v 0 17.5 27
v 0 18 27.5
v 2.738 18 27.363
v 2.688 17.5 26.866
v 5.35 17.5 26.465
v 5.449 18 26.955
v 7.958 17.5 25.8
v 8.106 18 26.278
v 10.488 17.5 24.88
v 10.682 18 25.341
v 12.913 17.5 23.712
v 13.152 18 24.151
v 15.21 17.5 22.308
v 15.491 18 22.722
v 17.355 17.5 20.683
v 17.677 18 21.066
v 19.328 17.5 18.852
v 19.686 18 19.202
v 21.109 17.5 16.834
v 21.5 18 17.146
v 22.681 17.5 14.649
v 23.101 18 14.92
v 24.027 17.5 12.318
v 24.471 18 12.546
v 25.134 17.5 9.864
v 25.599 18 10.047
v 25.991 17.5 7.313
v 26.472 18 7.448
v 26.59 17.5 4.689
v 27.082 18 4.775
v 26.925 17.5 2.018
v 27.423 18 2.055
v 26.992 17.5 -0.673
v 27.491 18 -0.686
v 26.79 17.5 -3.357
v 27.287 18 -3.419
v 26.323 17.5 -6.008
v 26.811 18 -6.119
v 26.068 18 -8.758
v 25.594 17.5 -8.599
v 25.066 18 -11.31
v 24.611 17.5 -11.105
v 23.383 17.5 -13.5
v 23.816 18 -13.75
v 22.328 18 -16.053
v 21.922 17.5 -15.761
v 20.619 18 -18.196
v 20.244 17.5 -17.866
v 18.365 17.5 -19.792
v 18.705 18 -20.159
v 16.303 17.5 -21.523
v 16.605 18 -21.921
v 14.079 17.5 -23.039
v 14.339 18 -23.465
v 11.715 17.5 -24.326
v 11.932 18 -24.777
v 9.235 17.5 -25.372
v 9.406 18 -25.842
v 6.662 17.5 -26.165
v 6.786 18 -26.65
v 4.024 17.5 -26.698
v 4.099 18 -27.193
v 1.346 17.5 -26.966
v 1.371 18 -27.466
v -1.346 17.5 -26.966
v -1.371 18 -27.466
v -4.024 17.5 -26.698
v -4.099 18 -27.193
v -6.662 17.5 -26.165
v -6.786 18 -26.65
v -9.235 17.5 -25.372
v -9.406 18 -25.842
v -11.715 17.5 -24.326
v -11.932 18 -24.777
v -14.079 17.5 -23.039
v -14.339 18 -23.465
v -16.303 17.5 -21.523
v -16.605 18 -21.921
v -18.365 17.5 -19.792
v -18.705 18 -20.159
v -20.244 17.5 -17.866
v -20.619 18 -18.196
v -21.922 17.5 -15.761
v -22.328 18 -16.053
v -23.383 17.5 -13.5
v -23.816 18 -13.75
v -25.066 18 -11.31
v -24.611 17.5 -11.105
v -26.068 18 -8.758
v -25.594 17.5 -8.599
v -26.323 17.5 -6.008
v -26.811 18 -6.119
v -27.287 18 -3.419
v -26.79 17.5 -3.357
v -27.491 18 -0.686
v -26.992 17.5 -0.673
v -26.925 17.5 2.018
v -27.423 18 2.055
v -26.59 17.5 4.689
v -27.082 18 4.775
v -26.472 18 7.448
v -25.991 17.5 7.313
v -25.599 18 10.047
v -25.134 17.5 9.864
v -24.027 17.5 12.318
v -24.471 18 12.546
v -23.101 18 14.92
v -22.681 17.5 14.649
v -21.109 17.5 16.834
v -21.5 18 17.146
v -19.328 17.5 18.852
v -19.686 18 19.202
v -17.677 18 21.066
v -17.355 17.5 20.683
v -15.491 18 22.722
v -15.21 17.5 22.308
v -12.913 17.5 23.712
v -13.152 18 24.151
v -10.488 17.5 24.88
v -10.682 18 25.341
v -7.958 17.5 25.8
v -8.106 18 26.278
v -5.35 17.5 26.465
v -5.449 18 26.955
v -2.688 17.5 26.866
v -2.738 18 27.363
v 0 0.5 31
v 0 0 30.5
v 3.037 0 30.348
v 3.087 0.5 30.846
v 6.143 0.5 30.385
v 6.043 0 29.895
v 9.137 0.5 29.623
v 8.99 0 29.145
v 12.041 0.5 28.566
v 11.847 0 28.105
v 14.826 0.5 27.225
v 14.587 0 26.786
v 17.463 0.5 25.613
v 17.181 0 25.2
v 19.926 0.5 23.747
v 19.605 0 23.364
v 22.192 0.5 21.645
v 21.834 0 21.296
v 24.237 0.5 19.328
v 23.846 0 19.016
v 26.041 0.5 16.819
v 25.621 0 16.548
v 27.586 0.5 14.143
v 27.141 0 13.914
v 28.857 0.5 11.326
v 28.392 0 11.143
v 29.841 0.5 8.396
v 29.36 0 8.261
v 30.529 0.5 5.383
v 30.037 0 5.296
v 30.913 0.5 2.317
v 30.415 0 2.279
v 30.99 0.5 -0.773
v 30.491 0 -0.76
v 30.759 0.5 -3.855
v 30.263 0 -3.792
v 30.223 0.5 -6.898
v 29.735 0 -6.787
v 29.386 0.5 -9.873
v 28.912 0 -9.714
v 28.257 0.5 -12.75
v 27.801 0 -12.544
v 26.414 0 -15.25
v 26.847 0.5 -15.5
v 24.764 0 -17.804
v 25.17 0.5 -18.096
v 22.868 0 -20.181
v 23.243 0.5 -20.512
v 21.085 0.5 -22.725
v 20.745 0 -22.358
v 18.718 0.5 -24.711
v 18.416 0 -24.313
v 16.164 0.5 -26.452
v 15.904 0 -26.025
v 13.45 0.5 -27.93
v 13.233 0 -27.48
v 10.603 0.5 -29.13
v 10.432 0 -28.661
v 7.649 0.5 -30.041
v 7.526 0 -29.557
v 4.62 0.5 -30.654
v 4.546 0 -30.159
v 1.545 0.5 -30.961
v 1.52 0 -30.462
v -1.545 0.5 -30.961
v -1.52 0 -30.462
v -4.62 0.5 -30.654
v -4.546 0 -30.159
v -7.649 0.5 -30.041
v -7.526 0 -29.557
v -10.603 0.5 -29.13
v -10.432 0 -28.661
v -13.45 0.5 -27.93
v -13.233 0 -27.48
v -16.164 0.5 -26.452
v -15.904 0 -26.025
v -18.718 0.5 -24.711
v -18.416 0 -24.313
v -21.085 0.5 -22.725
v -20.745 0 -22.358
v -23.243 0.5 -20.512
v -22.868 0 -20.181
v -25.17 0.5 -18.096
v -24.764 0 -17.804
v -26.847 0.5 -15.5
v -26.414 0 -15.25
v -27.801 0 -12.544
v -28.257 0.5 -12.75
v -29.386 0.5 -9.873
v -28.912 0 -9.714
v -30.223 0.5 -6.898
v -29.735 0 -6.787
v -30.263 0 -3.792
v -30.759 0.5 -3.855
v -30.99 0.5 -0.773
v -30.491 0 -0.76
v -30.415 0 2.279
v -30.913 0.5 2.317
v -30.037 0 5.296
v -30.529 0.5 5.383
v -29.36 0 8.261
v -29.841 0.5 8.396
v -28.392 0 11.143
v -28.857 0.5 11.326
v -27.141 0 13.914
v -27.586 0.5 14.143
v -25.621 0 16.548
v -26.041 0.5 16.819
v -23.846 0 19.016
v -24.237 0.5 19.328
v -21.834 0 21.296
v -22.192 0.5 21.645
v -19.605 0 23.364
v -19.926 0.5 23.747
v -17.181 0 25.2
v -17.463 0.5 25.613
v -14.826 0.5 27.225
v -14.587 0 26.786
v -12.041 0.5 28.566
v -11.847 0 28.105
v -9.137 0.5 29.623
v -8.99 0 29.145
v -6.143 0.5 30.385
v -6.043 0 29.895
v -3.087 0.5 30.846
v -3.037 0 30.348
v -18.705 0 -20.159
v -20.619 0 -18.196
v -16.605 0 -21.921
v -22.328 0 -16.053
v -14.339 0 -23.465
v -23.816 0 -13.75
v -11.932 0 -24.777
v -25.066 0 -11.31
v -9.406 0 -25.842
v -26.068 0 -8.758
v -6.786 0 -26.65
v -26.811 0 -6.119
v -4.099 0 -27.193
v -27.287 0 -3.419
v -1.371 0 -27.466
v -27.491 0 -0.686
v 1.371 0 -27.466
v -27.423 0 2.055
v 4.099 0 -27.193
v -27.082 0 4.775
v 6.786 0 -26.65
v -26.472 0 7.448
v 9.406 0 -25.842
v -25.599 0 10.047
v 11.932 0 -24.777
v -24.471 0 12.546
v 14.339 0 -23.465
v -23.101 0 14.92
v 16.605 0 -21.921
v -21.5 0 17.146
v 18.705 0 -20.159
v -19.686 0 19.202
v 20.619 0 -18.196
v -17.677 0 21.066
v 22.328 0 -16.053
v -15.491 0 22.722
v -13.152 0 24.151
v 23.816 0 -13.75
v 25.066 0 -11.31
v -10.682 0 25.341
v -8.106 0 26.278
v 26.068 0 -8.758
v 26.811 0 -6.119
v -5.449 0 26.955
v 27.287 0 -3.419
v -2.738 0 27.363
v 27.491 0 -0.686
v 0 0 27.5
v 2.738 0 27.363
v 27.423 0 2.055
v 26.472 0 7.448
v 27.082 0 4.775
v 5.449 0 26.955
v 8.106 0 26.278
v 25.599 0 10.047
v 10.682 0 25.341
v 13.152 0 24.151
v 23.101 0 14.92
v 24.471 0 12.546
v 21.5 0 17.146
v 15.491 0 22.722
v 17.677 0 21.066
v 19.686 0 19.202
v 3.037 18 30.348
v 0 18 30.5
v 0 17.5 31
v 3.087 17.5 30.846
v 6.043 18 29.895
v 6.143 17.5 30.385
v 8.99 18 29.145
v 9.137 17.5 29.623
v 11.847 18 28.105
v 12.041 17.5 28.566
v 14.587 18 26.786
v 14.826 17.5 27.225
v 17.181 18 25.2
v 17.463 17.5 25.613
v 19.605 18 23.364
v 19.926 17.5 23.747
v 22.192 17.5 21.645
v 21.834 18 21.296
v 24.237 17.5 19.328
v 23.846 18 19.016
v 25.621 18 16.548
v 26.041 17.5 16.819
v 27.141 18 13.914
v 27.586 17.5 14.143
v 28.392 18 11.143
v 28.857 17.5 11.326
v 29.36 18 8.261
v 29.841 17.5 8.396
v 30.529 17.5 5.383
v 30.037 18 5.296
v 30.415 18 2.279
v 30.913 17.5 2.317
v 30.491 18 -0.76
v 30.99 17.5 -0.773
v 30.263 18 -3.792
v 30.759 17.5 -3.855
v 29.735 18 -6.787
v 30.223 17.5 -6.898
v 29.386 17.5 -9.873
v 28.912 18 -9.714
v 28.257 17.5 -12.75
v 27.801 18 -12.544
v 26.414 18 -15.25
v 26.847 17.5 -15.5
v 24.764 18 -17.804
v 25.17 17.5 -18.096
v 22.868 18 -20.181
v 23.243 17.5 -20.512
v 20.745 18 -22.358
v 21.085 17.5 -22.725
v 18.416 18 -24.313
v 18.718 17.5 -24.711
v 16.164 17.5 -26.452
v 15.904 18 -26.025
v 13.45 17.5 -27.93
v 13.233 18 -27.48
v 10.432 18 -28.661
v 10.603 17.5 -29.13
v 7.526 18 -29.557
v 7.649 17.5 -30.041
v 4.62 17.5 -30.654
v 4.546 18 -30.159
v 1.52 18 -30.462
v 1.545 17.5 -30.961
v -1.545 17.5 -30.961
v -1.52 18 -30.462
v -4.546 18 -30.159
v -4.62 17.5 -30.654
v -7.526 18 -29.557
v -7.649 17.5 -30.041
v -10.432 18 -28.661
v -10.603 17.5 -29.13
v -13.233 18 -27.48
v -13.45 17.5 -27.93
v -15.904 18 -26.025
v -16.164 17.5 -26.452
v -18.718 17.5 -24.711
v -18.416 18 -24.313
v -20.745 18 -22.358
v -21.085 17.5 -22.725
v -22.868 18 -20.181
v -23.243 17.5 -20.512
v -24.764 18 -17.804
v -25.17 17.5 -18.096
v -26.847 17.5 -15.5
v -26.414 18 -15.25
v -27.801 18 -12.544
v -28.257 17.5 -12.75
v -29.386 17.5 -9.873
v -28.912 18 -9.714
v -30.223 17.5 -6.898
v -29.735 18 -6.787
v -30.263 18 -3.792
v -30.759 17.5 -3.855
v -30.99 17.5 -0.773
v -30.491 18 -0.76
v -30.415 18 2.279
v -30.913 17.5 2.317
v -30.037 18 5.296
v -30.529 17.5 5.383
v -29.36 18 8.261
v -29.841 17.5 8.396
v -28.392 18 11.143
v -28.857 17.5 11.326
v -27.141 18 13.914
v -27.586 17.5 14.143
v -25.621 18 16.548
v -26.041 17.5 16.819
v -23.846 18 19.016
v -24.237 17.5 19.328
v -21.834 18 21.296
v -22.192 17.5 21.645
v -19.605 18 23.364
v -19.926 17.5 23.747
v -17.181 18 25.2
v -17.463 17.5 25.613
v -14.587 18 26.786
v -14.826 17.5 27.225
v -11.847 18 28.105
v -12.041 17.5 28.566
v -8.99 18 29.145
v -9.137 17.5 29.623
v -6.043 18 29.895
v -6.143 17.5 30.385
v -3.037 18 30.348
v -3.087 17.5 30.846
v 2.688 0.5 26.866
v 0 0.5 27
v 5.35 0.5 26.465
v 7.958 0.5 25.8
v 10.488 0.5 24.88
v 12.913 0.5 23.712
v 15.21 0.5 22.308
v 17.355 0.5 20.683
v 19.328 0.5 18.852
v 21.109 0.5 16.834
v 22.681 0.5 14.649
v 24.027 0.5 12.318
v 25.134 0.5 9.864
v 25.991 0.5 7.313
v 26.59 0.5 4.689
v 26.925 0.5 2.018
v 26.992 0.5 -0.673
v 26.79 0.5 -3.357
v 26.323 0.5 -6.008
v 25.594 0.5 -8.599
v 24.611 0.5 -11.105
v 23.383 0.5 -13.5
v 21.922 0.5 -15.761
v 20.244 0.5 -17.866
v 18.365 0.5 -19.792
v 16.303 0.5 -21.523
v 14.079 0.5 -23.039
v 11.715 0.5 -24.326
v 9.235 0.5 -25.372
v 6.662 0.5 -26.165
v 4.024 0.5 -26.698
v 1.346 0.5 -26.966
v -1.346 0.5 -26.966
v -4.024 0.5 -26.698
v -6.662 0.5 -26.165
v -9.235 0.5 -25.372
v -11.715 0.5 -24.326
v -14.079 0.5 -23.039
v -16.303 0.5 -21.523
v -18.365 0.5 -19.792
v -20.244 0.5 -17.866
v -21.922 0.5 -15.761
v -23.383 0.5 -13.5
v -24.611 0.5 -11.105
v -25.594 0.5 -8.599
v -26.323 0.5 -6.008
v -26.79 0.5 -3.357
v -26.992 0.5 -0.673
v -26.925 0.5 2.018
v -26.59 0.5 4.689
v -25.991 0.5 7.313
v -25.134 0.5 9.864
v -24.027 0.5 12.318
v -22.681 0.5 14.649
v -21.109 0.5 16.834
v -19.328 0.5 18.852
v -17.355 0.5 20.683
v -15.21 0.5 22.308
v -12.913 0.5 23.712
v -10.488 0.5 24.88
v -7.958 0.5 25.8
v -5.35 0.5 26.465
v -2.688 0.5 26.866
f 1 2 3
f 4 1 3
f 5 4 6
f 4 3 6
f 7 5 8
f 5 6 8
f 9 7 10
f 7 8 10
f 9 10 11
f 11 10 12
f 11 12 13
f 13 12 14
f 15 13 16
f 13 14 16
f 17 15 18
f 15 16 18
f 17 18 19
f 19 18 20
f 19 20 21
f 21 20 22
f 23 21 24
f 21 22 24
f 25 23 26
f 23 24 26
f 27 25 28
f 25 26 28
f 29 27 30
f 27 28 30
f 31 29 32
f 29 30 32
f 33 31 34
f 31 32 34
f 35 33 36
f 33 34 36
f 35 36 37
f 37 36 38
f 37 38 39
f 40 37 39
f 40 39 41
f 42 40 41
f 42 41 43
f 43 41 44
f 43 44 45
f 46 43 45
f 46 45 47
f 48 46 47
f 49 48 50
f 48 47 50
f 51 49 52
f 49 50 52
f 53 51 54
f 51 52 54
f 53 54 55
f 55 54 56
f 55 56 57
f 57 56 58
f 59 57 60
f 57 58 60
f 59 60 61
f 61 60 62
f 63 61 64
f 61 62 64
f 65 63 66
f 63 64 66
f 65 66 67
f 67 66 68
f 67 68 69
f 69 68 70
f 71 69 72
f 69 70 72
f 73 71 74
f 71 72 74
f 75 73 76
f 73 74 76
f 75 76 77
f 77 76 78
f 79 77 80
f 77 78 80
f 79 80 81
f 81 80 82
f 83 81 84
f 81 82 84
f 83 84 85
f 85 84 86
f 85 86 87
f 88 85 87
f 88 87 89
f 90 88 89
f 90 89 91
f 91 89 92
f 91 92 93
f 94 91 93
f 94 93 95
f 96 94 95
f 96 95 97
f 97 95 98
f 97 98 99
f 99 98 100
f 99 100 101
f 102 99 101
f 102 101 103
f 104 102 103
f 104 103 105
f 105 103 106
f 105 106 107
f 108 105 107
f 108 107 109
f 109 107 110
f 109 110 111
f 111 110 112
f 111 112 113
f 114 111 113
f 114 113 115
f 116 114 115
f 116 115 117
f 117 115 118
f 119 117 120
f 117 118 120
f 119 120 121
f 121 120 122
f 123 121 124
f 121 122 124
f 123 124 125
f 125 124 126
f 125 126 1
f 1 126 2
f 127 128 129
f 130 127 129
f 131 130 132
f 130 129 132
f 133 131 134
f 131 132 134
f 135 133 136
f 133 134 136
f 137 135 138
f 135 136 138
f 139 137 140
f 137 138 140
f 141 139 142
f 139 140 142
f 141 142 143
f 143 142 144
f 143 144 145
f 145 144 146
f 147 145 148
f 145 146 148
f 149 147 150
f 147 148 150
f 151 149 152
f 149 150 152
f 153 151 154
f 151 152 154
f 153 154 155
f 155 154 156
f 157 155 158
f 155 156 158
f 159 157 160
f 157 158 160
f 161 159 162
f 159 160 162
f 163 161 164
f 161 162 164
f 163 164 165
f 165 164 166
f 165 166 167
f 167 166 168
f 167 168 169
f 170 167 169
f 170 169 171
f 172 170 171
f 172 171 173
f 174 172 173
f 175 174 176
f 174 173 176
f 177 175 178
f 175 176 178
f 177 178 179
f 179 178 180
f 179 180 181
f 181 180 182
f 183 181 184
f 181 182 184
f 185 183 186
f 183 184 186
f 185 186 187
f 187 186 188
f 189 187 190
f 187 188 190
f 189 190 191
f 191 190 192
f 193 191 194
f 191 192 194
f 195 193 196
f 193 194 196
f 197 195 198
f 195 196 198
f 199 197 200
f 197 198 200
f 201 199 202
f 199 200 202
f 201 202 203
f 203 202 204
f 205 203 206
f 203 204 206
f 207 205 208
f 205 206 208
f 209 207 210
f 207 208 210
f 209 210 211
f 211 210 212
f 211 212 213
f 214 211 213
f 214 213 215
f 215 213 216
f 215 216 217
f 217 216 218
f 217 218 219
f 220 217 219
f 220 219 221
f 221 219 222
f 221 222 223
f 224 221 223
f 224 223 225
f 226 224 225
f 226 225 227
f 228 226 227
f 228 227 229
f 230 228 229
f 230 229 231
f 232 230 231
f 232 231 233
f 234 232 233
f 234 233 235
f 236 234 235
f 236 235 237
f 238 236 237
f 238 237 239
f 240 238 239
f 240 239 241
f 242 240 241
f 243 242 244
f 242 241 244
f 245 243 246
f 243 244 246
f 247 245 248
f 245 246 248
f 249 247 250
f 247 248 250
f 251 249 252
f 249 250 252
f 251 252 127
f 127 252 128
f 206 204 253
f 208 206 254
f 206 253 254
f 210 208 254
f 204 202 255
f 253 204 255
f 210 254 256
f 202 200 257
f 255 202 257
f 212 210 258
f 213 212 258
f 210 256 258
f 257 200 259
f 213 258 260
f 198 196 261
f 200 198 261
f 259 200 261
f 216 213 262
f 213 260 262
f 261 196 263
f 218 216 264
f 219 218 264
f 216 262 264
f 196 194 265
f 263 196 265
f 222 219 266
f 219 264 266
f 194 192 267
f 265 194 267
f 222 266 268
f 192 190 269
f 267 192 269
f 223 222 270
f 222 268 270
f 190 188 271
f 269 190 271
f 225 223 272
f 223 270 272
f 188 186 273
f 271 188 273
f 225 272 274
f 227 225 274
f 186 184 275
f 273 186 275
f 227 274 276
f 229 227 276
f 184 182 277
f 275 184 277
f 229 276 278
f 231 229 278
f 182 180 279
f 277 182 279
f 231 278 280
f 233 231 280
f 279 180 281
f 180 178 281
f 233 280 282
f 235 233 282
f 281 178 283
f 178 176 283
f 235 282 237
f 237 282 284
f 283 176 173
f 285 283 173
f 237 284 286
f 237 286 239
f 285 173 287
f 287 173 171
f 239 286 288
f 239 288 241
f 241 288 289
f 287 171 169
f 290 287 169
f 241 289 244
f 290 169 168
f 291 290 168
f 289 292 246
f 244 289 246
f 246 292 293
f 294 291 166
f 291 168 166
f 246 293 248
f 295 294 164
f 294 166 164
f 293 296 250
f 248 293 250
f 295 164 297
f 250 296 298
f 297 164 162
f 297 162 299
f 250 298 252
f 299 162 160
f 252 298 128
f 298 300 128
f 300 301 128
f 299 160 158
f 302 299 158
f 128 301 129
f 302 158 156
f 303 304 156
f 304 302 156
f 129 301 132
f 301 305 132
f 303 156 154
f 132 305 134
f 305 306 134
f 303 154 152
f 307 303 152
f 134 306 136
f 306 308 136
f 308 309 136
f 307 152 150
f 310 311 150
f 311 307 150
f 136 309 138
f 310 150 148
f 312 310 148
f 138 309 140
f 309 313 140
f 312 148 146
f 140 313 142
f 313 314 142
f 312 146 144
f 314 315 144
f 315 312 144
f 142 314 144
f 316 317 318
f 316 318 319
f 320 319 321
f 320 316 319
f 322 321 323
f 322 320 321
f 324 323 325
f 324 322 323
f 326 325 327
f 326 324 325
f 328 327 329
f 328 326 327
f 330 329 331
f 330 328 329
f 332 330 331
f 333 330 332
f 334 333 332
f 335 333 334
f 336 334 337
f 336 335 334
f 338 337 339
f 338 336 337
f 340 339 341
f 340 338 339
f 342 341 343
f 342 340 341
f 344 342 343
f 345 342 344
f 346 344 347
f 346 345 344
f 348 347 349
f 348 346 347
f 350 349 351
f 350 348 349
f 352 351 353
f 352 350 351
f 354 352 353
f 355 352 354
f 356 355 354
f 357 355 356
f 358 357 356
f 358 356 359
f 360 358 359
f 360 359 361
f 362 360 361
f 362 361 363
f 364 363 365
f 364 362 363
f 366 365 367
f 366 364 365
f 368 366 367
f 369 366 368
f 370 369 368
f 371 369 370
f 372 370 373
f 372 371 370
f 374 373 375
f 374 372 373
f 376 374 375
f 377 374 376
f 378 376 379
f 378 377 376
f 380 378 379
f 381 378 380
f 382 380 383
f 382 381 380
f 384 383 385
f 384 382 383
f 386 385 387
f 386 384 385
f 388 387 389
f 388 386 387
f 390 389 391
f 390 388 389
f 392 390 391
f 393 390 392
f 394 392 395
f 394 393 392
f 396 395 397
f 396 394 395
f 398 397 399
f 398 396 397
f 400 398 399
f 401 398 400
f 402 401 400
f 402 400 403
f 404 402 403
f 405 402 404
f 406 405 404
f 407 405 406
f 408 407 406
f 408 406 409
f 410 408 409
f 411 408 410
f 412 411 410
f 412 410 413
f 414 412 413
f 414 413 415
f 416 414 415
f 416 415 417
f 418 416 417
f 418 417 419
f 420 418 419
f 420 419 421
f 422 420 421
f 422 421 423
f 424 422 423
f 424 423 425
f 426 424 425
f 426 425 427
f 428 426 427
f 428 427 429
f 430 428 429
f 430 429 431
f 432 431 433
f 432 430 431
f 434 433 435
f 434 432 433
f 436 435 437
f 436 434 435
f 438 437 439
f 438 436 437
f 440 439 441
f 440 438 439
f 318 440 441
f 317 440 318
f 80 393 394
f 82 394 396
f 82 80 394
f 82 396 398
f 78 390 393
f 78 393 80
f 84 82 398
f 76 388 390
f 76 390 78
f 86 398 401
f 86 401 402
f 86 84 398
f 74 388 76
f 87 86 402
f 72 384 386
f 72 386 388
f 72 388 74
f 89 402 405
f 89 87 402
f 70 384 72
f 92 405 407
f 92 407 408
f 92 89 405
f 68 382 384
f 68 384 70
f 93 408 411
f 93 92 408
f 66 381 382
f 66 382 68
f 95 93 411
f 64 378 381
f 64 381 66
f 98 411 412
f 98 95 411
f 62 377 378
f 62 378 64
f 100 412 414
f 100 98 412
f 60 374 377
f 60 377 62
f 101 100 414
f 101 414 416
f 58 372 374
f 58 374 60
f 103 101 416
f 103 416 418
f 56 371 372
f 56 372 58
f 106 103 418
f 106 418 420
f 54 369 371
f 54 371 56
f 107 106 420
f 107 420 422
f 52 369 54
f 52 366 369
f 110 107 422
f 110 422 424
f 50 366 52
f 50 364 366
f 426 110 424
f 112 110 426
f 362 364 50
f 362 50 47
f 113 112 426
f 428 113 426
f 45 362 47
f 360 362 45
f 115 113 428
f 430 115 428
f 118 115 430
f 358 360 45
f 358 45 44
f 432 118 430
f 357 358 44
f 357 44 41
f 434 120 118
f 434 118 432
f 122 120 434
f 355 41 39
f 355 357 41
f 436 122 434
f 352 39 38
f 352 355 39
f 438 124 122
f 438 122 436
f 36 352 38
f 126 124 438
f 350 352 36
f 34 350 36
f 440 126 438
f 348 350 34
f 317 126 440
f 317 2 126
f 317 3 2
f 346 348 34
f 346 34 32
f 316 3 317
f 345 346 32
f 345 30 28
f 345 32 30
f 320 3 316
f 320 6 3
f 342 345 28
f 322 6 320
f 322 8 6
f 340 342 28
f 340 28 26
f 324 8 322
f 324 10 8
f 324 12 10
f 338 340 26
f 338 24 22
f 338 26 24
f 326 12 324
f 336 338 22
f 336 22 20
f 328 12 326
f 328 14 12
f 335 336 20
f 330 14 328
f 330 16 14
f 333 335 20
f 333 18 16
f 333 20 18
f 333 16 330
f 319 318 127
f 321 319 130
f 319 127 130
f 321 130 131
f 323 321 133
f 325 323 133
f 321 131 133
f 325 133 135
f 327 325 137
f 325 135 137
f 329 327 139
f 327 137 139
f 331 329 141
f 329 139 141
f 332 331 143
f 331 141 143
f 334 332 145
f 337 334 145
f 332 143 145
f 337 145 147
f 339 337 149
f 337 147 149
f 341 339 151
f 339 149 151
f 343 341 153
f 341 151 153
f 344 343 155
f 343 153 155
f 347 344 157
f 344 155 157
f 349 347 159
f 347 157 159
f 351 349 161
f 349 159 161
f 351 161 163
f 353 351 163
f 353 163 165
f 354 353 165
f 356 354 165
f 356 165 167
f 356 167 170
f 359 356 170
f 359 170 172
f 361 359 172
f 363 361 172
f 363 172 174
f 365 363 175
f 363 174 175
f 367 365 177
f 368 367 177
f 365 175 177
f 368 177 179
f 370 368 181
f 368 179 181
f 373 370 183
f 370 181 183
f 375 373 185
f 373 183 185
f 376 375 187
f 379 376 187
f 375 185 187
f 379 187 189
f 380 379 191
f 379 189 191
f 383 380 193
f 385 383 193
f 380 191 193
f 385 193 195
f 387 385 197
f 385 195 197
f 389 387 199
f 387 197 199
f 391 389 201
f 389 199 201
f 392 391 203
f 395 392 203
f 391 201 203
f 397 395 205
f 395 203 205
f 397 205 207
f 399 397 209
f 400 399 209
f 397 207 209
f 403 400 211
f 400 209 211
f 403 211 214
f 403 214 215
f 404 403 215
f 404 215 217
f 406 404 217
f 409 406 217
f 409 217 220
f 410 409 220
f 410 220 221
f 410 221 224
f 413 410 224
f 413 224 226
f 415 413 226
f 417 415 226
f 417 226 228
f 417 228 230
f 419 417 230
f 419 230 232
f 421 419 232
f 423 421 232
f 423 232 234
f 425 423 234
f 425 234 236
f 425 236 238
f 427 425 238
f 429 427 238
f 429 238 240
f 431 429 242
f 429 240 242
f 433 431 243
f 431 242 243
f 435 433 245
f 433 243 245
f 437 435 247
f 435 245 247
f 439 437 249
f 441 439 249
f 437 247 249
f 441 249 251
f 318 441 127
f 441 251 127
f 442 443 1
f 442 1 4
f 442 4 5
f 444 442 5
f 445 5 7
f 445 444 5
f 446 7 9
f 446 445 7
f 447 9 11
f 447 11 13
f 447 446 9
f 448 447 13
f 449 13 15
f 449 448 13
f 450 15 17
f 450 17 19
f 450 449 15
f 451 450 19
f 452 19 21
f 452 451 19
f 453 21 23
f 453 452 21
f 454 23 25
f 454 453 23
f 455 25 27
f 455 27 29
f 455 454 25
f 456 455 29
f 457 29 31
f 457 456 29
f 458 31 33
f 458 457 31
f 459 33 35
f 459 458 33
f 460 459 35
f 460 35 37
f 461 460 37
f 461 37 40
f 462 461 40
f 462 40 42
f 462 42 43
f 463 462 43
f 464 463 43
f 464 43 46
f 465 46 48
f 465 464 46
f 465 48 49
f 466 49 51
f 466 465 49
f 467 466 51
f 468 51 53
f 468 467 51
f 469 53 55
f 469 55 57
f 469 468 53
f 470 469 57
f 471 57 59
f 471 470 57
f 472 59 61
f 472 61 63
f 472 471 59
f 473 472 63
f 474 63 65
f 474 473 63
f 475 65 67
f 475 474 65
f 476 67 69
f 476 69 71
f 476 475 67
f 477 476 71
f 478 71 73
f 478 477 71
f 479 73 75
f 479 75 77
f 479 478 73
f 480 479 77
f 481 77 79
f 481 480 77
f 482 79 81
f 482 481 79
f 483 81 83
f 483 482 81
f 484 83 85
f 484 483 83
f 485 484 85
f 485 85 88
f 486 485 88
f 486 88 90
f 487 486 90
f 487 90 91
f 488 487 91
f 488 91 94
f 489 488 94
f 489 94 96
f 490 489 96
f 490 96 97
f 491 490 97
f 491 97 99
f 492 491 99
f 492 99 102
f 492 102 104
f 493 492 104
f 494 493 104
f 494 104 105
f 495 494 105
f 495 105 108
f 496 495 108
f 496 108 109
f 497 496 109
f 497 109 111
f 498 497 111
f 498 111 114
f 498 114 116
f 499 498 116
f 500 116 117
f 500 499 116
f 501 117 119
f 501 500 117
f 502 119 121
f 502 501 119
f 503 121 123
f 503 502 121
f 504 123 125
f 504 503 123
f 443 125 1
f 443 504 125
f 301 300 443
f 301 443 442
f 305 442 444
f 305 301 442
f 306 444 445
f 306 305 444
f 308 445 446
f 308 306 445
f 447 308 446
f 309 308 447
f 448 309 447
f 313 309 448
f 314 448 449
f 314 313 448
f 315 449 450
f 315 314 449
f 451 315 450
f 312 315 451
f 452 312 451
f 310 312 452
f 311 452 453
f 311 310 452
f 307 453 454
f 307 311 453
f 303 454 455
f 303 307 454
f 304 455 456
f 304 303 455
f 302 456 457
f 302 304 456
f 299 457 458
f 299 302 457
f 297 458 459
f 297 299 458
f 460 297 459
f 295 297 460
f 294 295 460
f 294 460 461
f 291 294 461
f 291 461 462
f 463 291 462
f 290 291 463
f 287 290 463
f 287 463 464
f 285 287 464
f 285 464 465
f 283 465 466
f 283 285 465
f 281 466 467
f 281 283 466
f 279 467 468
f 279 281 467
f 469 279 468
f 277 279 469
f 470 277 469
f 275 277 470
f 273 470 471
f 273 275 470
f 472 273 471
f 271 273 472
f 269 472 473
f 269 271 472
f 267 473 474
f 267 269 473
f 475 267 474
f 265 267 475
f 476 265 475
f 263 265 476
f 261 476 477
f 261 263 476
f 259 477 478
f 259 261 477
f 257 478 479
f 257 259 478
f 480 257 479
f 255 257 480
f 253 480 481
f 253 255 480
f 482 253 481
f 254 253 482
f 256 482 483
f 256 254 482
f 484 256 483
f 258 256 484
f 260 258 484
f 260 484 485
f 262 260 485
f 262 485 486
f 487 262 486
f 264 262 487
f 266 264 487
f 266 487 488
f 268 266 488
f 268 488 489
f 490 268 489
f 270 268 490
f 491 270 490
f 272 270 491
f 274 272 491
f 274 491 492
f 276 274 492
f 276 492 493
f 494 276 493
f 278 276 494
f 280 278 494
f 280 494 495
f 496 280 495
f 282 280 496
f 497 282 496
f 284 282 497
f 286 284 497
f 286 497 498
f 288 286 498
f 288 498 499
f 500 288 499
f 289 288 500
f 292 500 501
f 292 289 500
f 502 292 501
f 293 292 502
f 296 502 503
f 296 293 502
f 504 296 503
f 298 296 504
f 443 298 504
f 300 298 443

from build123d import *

# Parameters (mm, degrees)
SCHIZZO1_R        = 31
SCHIZZO1_R_2      = 27
ESTRUSIONE1_DEPTH = 18
SMUSSO1_SIZE      = 0.5


with BuildPart() as part:
    # Schizzo1 → Estrusione1 (new body)
    with BuildSketch(Plane(origin=(0, 0, 0), x_dir=(1, 0, 0), z_dir=(0, 1, 0))):
        with Locations(Location((0, 0, 0), (0, 0, 270))):
            Circle(SCHIZZO1_R)
        with Locations(Location((0, 0, 0), (0, 0, 270))):
            Circle(SCHIZZO1_R_2, mode=Mode.SUBTRACT)
    extrude(amount=ESTRUSIONE1_DEPTH)

    # Smusso1
    smusso1_edges = [part.edges().sort_by_distance(p)[0] for p in [
        (0, 0, -31),
        (0, 18, -31),
        (0, 0, -27),
        (0, 18, -27),
    ]]
    chamfer(smusso1_edges, length=SMUSSO1_SIZE)


solid = part.part
